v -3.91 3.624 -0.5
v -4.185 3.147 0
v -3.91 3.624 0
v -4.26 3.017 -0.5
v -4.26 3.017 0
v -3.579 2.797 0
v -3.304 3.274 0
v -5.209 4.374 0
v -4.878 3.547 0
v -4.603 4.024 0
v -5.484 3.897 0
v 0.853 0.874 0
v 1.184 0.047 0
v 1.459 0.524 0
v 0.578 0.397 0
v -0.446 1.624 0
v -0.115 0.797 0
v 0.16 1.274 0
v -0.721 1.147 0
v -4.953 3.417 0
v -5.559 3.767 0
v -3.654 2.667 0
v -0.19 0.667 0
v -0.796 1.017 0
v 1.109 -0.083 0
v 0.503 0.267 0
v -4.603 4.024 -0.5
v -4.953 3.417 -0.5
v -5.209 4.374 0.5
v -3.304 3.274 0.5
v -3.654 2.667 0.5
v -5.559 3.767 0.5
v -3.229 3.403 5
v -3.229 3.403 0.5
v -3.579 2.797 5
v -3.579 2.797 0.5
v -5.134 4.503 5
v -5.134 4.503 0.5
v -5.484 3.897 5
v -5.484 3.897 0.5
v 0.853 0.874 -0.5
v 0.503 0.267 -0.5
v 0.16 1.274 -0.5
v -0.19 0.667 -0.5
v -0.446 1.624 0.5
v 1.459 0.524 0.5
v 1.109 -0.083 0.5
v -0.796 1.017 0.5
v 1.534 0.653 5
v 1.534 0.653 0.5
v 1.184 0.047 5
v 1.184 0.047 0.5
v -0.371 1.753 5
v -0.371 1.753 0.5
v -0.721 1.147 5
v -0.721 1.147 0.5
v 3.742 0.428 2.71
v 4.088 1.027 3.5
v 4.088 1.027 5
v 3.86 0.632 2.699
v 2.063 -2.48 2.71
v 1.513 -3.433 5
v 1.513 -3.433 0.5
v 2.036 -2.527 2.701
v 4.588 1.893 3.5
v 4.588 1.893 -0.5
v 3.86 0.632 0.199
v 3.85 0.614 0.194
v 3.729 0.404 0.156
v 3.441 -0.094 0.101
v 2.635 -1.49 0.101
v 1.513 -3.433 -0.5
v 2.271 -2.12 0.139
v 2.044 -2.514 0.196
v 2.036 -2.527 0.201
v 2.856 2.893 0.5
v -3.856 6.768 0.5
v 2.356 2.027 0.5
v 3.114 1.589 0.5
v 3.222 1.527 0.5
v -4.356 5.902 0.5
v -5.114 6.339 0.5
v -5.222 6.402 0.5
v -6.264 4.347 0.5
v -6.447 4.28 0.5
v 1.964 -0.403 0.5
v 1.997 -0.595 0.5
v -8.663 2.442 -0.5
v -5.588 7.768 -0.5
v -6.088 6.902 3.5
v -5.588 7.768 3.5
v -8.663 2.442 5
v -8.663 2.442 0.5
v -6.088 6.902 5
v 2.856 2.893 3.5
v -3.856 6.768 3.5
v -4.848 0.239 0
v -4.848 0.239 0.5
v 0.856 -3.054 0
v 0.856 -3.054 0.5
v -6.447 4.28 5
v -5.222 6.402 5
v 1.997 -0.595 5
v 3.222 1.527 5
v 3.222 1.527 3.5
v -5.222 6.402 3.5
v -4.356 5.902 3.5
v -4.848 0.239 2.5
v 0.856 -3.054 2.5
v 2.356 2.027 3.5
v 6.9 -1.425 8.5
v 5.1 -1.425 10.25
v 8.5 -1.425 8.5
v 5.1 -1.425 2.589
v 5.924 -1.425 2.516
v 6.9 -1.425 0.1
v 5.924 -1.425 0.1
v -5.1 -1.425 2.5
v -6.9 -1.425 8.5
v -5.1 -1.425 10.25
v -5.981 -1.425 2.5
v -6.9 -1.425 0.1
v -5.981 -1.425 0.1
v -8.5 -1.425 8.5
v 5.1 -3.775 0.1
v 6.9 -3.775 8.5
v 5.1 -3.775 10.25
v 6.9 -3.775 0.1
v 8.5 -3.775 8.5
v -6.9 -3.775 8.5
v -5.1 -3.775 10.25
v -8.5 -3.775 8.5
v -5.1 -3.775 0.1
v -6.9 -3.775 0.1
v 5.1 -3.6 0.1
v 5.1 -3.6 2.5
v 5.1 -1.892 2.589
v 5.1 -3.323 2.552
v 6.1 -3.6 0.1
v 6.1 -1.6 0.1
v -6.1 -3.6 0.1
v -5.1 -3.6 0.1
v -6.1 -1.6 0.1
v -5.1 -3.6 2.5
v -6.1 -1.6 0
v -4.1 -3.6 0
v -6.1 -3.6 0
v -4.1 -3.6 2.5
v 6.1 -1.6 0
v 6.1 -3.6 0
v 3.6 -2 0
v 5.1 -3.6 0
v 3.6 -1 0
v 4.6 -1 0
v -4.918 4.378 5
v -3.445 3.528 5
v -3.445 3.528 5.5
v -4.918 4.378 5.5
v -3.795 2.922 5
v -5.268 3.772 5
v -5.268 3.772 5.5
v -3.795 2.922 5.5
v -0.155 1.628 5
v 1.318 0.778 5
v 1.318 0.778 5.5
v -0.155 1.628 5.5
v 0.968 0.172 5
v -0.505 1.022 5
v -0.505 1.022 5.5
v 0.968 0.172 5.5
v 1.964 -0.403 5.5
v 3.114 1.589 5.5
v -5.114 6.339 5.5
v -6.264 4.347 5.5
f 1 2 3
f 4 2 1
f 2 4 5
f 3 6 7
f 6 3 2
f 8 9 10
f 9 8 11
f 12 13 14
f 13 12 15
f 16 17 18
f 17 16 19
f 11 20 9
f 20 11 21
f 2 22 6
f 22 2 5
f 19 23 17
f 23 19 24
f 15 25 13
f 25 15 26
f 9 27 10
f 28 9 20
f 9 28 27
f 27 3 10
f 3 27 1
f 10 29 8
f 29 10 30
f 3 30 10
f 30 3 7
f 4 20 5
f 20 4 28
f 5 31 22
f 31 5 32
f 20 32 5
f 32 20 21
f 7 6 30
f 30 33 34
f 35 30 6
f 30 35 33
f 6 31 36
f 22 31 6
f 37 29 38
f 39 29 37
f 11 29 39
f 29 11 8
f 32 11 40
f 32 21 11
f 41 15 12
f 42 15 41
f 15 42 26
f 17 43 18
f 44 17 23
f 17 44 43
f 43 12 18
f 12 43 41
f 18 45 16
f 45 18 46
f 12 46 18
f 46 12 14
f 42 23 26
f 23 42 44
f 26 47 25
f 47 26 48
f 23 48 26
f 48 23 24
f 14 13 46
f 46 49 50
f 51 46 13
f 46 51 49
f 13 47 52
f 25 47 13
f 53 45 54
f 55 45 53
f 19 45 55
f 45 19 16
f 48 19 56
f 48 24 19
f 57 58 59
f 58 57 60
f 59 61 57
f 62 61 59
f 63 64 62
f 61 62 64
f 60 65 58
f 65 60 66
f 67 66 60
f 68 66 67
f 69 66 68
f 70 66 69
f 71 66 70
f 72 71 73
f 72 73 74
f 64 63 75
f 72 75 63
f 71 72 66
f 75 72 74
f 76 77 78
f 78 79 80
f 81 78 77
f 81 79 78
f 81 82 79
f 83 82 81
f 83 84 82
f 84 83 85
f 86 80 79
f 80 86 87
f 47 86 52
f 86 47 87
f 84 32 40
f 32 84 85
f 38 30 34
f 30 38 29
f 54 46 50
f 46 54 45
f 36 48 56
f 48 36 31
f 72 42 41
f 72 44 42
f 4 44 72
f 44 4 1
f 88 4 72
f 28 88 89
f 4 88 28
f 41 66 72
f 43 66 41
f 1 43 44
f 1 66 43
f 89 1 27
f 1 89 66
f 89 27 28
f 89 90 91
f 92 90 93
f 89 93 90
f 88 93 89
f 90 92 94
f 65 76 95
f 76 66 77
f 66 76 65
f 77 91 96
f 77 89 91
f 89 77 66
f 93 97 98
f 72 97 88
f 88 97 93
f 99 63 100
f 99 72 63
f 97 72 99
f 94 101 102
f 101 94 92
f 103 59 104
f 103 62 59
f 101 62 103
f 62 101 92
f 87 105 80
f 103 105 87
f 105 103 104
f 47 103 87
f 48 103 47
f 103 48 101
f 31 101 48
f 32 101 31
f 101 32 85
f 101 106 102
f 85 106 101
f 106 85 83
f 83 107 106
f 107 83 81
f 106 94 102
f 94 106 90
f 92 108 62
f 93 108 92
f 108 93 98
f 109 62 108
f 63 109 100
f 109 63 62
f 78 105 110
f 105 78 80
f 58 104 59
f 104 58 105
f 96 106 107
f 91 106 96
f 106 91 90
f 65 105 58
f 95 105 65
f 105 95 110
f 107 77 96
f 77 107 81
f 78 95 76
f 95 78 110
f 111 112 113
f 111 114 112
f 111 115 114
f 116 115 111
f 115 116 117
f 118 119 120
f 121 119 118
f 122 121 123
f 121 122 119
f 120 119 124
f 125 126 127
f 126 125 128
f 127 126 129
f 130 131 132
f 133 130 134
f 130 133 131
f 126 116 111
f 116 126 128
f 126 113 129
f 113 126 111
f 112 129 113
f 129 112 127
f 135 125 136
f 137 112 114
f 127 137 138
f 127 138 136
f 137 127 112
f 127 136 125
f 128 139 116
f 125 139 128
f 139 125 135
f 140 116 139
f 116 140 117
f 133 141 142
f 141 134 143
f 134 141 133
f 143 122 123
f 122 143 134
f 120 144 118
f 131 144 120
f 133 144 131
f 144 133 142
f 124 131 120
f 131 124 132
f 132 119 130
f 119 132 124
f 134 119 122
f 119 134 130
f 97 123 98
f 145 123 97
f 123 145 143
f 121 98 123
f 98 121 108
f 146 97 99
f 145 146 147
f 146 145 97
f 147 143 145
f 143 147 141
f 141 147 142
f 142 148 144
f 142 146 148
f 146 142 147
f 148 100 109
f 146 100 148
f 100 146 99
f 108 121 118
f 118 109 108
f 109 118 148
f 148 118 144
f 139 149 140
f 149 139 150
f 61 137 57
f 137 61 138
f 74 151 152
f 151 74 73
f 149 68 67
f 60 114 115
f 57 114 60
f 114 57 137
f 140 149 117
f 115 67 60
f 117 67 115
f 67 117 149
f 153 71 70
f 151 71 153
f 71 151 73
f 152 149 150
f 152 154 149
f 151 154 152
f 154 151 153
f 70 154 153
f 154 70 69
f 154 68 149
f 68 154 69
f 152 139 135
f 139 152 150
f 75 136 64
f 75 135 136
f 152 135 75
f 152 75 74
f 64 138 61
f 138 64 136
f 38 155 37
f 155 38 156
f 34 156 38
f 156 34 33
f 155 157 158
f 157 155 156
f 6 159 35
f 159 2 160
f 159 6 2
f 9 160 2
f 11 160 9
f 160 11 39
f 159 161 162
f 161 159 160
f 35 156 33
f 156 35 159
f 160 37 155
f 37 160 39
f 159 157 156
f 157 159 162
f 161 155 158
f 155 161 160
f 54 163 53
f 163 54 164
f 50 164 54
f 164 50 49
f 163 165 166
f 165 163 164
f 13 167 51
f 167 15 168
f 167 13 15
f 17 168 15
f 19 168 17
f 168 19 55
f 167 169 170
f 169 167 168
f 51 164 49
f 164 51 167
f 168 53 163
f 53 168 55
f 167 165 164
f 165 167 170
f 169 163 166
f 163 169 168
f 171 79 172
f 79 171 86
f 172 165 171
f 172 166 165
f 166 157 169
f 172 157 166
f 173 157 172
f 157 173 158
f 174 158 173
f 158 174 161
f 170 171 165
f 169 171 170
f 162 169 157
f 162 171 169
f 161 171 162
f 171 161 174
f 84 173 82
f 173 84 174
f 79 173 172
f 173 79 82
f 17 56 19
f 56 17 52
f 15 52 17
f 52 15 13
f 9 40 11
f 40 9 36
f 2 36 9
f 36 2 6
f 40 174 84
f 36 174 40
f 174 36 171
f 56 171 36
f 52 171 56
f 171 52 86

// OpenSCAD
union () {
  union () {
    translate ([-3, 0.5, 2.75]) {
      rotate (a=-30.00000000000001, v=[0, 0, 1]) {
        translate ([0, 4, 0]) {
          union () {
            linear_extrude (height=4.5, center=true){
              union () {
                translate ([4.875, -4.15, ]) {
                  square ([1, 4.15]);
                }
                translate ([-4.875, -4.15, ]) {
                  mirror ([1, 0, ]) {
                    square ([1, 4.15]);
                  }
                }
                translate ([0, -3.8000000000000003, ]) {
                  square ([11.75, 2.7], center=true);
                }
              }
            }
            translate ([0, 0, -0.75]) {
              linear_extrude (height=3, center=true){
                union () {
                  translate ([-5.875, 0, ]) {
                    polygon (points=[[0, 0], [2, 0], [2, 1], [0, 1]]);
                  }
                  translate ([5.875, 0, ]) {
                    mirror ([1, 0, ]) {
                      polygon (points=[[0, 0], [2, 0], [2, 1], [0, 1]]);
                    }
                  }
                }
              }
            }
            difference () {
              translate ([0, -2.075, -2.75]) {
                cube ([11.75, 6.15, 1], center=true);
              }
              translate ([0, -2.45, 0]) {
                union () {
                  translate ([-2.75, 0, -6.75]) {
                    translate ([0, 0.35, 0]) {
                      union () {
                        translate ([0, 0, 2]) {
                          cube ([0.8, 0.7, 4], center=true);
                        }
                        translate ([0, 0, 6.5]) {
                          cube ([2.2, 0.7, 5], center=true);
                        }
                        translate ([0, 0, 9.5]) {
                          cube ([1.7, 0.7, 1], center=true);
                        }
                      }
                    }
                  }
                  translate ([2.75, 0, -6.75]) {
                    translate ([0, 0.35, 0]) {
                      union () {
                        translate ([0, 0, 2]) {
                          cube ([0.8, 0.7, 4], center=true);
                        }
                        translate ([0, 0, 6.5]) {
                          cube ([2.2, 0.7, 5], center=true);
                        }
                        translate ([0, 0, 9.5]) {
                          cube ([1.7, 0.7, 1], center=true);
                        }
                      }
                    }
                  }
                }
              }
            }
          }
        }
      }
    }
    translate ([0, -2.6, 8.5]) {
      rotate (a=90.0, v=[1, 0, 0]) {
        linear_extrude (height=2.35, center=true){
          union () {
            translate ([5.1, 0, 0]) {
              polygon (points=[[0, 1.75], [3.4, 0], [0, 0]]);
            }
            translate ([-5.1, 0, 0]) {
              mirror ([1, 0, ]) {
                polygon (points=[[0, 1.75], [3.4, 0], [0, 0]]);
              }
            }
            translate ([5.1, 0, 0]) {
              translate ([0, -8.4, ]) {
                square ([1.8, 8.4]);
              }
            }
            translate ([-5.1, 0, 0]) {
              mirror ([1, 0, ]) {
                translate ([0, -8.4, ]) {
                  square ([1.8, 8.4]);
                }
              }
            }
          }
        }
      }
    }
    hull () {
      translate ([-1.5999999999999996, -1.2, 1.25]) {
        rotate (a=-30.00000000000001, v=[0, 0, 1]) {
          cube ([7, 0.1, 2.5], center=true);
        }
      }
      translate ([-5.1, -2.6, 1.25]) {
        cube ([2, 2, 2.5], center=true);
      }
    }
    hull () {
      translate ([-3, 0.5, 2.75]) {
        rotate (a=-30.00000000000001, v=[0, 0, 1]) {
          translate ([0, 4, 0]) {
            translate ([5.05, -2.25, -1.25]) {
              cube ([0.1, 4, 2.5], center=true);
            }
          }
        }
      }
      translate ([4.1, -1.5, 1.25]) {
        cube ([1, 1, 2.5], center=true);
      }
      translate ([5.6, -2.6, 1.25]) {
        cube ([1, 2, 2.5], center=true);
      }
    }
  }
  translate ([-3, 0.5, 2.75]) {
    rotate (a=-30.00000000000001, v=[0, 0, 1]) {
      translate ([0, 4, 0]) {
        translate ([0, -2.3, 0]) {
          difference () {
            translate ([0, 1.15, 0]) {
              cube ([9.5, 2.3, 5.5], center=true);
            }
            union () {
              translate ([-2.75, 0, -6.75]) {
                translate ([0, 0.35, 0]) {
                  union () {
                    translate ([0, 0, 2]) {
                      cube ([0.8, 0.7, 4], center=true);
                    }
                    translate ([0, 0, 6.5]) {
                      cube ([2.2, 0.7, 5], center=true);
                    }
                    translate ([0, 0, 9.5]) {
                      cube ([1.7, 0.7, 1], center=true);
                    }
                  }
                }
              }
              translate ([2.75, 0, -6.75]) {
                translate ([0, 0.35, 0]) {
                  union () {
                    translate ([0, 0, 2]) {
                      cube ([0.8, 0.7, 4], center=true);
                    }
                    translate ([0, 0, 6.5]) {
                      cube ([2.2, 0.7, 5], center=true);
                    }
                    translate ([0, 0, 9.5]) {
                      cube ([1.7, 0.7, 1], center=true);
                    }
                  }
                }
              }
            }
          }
        }
      }
    }
  }
}
